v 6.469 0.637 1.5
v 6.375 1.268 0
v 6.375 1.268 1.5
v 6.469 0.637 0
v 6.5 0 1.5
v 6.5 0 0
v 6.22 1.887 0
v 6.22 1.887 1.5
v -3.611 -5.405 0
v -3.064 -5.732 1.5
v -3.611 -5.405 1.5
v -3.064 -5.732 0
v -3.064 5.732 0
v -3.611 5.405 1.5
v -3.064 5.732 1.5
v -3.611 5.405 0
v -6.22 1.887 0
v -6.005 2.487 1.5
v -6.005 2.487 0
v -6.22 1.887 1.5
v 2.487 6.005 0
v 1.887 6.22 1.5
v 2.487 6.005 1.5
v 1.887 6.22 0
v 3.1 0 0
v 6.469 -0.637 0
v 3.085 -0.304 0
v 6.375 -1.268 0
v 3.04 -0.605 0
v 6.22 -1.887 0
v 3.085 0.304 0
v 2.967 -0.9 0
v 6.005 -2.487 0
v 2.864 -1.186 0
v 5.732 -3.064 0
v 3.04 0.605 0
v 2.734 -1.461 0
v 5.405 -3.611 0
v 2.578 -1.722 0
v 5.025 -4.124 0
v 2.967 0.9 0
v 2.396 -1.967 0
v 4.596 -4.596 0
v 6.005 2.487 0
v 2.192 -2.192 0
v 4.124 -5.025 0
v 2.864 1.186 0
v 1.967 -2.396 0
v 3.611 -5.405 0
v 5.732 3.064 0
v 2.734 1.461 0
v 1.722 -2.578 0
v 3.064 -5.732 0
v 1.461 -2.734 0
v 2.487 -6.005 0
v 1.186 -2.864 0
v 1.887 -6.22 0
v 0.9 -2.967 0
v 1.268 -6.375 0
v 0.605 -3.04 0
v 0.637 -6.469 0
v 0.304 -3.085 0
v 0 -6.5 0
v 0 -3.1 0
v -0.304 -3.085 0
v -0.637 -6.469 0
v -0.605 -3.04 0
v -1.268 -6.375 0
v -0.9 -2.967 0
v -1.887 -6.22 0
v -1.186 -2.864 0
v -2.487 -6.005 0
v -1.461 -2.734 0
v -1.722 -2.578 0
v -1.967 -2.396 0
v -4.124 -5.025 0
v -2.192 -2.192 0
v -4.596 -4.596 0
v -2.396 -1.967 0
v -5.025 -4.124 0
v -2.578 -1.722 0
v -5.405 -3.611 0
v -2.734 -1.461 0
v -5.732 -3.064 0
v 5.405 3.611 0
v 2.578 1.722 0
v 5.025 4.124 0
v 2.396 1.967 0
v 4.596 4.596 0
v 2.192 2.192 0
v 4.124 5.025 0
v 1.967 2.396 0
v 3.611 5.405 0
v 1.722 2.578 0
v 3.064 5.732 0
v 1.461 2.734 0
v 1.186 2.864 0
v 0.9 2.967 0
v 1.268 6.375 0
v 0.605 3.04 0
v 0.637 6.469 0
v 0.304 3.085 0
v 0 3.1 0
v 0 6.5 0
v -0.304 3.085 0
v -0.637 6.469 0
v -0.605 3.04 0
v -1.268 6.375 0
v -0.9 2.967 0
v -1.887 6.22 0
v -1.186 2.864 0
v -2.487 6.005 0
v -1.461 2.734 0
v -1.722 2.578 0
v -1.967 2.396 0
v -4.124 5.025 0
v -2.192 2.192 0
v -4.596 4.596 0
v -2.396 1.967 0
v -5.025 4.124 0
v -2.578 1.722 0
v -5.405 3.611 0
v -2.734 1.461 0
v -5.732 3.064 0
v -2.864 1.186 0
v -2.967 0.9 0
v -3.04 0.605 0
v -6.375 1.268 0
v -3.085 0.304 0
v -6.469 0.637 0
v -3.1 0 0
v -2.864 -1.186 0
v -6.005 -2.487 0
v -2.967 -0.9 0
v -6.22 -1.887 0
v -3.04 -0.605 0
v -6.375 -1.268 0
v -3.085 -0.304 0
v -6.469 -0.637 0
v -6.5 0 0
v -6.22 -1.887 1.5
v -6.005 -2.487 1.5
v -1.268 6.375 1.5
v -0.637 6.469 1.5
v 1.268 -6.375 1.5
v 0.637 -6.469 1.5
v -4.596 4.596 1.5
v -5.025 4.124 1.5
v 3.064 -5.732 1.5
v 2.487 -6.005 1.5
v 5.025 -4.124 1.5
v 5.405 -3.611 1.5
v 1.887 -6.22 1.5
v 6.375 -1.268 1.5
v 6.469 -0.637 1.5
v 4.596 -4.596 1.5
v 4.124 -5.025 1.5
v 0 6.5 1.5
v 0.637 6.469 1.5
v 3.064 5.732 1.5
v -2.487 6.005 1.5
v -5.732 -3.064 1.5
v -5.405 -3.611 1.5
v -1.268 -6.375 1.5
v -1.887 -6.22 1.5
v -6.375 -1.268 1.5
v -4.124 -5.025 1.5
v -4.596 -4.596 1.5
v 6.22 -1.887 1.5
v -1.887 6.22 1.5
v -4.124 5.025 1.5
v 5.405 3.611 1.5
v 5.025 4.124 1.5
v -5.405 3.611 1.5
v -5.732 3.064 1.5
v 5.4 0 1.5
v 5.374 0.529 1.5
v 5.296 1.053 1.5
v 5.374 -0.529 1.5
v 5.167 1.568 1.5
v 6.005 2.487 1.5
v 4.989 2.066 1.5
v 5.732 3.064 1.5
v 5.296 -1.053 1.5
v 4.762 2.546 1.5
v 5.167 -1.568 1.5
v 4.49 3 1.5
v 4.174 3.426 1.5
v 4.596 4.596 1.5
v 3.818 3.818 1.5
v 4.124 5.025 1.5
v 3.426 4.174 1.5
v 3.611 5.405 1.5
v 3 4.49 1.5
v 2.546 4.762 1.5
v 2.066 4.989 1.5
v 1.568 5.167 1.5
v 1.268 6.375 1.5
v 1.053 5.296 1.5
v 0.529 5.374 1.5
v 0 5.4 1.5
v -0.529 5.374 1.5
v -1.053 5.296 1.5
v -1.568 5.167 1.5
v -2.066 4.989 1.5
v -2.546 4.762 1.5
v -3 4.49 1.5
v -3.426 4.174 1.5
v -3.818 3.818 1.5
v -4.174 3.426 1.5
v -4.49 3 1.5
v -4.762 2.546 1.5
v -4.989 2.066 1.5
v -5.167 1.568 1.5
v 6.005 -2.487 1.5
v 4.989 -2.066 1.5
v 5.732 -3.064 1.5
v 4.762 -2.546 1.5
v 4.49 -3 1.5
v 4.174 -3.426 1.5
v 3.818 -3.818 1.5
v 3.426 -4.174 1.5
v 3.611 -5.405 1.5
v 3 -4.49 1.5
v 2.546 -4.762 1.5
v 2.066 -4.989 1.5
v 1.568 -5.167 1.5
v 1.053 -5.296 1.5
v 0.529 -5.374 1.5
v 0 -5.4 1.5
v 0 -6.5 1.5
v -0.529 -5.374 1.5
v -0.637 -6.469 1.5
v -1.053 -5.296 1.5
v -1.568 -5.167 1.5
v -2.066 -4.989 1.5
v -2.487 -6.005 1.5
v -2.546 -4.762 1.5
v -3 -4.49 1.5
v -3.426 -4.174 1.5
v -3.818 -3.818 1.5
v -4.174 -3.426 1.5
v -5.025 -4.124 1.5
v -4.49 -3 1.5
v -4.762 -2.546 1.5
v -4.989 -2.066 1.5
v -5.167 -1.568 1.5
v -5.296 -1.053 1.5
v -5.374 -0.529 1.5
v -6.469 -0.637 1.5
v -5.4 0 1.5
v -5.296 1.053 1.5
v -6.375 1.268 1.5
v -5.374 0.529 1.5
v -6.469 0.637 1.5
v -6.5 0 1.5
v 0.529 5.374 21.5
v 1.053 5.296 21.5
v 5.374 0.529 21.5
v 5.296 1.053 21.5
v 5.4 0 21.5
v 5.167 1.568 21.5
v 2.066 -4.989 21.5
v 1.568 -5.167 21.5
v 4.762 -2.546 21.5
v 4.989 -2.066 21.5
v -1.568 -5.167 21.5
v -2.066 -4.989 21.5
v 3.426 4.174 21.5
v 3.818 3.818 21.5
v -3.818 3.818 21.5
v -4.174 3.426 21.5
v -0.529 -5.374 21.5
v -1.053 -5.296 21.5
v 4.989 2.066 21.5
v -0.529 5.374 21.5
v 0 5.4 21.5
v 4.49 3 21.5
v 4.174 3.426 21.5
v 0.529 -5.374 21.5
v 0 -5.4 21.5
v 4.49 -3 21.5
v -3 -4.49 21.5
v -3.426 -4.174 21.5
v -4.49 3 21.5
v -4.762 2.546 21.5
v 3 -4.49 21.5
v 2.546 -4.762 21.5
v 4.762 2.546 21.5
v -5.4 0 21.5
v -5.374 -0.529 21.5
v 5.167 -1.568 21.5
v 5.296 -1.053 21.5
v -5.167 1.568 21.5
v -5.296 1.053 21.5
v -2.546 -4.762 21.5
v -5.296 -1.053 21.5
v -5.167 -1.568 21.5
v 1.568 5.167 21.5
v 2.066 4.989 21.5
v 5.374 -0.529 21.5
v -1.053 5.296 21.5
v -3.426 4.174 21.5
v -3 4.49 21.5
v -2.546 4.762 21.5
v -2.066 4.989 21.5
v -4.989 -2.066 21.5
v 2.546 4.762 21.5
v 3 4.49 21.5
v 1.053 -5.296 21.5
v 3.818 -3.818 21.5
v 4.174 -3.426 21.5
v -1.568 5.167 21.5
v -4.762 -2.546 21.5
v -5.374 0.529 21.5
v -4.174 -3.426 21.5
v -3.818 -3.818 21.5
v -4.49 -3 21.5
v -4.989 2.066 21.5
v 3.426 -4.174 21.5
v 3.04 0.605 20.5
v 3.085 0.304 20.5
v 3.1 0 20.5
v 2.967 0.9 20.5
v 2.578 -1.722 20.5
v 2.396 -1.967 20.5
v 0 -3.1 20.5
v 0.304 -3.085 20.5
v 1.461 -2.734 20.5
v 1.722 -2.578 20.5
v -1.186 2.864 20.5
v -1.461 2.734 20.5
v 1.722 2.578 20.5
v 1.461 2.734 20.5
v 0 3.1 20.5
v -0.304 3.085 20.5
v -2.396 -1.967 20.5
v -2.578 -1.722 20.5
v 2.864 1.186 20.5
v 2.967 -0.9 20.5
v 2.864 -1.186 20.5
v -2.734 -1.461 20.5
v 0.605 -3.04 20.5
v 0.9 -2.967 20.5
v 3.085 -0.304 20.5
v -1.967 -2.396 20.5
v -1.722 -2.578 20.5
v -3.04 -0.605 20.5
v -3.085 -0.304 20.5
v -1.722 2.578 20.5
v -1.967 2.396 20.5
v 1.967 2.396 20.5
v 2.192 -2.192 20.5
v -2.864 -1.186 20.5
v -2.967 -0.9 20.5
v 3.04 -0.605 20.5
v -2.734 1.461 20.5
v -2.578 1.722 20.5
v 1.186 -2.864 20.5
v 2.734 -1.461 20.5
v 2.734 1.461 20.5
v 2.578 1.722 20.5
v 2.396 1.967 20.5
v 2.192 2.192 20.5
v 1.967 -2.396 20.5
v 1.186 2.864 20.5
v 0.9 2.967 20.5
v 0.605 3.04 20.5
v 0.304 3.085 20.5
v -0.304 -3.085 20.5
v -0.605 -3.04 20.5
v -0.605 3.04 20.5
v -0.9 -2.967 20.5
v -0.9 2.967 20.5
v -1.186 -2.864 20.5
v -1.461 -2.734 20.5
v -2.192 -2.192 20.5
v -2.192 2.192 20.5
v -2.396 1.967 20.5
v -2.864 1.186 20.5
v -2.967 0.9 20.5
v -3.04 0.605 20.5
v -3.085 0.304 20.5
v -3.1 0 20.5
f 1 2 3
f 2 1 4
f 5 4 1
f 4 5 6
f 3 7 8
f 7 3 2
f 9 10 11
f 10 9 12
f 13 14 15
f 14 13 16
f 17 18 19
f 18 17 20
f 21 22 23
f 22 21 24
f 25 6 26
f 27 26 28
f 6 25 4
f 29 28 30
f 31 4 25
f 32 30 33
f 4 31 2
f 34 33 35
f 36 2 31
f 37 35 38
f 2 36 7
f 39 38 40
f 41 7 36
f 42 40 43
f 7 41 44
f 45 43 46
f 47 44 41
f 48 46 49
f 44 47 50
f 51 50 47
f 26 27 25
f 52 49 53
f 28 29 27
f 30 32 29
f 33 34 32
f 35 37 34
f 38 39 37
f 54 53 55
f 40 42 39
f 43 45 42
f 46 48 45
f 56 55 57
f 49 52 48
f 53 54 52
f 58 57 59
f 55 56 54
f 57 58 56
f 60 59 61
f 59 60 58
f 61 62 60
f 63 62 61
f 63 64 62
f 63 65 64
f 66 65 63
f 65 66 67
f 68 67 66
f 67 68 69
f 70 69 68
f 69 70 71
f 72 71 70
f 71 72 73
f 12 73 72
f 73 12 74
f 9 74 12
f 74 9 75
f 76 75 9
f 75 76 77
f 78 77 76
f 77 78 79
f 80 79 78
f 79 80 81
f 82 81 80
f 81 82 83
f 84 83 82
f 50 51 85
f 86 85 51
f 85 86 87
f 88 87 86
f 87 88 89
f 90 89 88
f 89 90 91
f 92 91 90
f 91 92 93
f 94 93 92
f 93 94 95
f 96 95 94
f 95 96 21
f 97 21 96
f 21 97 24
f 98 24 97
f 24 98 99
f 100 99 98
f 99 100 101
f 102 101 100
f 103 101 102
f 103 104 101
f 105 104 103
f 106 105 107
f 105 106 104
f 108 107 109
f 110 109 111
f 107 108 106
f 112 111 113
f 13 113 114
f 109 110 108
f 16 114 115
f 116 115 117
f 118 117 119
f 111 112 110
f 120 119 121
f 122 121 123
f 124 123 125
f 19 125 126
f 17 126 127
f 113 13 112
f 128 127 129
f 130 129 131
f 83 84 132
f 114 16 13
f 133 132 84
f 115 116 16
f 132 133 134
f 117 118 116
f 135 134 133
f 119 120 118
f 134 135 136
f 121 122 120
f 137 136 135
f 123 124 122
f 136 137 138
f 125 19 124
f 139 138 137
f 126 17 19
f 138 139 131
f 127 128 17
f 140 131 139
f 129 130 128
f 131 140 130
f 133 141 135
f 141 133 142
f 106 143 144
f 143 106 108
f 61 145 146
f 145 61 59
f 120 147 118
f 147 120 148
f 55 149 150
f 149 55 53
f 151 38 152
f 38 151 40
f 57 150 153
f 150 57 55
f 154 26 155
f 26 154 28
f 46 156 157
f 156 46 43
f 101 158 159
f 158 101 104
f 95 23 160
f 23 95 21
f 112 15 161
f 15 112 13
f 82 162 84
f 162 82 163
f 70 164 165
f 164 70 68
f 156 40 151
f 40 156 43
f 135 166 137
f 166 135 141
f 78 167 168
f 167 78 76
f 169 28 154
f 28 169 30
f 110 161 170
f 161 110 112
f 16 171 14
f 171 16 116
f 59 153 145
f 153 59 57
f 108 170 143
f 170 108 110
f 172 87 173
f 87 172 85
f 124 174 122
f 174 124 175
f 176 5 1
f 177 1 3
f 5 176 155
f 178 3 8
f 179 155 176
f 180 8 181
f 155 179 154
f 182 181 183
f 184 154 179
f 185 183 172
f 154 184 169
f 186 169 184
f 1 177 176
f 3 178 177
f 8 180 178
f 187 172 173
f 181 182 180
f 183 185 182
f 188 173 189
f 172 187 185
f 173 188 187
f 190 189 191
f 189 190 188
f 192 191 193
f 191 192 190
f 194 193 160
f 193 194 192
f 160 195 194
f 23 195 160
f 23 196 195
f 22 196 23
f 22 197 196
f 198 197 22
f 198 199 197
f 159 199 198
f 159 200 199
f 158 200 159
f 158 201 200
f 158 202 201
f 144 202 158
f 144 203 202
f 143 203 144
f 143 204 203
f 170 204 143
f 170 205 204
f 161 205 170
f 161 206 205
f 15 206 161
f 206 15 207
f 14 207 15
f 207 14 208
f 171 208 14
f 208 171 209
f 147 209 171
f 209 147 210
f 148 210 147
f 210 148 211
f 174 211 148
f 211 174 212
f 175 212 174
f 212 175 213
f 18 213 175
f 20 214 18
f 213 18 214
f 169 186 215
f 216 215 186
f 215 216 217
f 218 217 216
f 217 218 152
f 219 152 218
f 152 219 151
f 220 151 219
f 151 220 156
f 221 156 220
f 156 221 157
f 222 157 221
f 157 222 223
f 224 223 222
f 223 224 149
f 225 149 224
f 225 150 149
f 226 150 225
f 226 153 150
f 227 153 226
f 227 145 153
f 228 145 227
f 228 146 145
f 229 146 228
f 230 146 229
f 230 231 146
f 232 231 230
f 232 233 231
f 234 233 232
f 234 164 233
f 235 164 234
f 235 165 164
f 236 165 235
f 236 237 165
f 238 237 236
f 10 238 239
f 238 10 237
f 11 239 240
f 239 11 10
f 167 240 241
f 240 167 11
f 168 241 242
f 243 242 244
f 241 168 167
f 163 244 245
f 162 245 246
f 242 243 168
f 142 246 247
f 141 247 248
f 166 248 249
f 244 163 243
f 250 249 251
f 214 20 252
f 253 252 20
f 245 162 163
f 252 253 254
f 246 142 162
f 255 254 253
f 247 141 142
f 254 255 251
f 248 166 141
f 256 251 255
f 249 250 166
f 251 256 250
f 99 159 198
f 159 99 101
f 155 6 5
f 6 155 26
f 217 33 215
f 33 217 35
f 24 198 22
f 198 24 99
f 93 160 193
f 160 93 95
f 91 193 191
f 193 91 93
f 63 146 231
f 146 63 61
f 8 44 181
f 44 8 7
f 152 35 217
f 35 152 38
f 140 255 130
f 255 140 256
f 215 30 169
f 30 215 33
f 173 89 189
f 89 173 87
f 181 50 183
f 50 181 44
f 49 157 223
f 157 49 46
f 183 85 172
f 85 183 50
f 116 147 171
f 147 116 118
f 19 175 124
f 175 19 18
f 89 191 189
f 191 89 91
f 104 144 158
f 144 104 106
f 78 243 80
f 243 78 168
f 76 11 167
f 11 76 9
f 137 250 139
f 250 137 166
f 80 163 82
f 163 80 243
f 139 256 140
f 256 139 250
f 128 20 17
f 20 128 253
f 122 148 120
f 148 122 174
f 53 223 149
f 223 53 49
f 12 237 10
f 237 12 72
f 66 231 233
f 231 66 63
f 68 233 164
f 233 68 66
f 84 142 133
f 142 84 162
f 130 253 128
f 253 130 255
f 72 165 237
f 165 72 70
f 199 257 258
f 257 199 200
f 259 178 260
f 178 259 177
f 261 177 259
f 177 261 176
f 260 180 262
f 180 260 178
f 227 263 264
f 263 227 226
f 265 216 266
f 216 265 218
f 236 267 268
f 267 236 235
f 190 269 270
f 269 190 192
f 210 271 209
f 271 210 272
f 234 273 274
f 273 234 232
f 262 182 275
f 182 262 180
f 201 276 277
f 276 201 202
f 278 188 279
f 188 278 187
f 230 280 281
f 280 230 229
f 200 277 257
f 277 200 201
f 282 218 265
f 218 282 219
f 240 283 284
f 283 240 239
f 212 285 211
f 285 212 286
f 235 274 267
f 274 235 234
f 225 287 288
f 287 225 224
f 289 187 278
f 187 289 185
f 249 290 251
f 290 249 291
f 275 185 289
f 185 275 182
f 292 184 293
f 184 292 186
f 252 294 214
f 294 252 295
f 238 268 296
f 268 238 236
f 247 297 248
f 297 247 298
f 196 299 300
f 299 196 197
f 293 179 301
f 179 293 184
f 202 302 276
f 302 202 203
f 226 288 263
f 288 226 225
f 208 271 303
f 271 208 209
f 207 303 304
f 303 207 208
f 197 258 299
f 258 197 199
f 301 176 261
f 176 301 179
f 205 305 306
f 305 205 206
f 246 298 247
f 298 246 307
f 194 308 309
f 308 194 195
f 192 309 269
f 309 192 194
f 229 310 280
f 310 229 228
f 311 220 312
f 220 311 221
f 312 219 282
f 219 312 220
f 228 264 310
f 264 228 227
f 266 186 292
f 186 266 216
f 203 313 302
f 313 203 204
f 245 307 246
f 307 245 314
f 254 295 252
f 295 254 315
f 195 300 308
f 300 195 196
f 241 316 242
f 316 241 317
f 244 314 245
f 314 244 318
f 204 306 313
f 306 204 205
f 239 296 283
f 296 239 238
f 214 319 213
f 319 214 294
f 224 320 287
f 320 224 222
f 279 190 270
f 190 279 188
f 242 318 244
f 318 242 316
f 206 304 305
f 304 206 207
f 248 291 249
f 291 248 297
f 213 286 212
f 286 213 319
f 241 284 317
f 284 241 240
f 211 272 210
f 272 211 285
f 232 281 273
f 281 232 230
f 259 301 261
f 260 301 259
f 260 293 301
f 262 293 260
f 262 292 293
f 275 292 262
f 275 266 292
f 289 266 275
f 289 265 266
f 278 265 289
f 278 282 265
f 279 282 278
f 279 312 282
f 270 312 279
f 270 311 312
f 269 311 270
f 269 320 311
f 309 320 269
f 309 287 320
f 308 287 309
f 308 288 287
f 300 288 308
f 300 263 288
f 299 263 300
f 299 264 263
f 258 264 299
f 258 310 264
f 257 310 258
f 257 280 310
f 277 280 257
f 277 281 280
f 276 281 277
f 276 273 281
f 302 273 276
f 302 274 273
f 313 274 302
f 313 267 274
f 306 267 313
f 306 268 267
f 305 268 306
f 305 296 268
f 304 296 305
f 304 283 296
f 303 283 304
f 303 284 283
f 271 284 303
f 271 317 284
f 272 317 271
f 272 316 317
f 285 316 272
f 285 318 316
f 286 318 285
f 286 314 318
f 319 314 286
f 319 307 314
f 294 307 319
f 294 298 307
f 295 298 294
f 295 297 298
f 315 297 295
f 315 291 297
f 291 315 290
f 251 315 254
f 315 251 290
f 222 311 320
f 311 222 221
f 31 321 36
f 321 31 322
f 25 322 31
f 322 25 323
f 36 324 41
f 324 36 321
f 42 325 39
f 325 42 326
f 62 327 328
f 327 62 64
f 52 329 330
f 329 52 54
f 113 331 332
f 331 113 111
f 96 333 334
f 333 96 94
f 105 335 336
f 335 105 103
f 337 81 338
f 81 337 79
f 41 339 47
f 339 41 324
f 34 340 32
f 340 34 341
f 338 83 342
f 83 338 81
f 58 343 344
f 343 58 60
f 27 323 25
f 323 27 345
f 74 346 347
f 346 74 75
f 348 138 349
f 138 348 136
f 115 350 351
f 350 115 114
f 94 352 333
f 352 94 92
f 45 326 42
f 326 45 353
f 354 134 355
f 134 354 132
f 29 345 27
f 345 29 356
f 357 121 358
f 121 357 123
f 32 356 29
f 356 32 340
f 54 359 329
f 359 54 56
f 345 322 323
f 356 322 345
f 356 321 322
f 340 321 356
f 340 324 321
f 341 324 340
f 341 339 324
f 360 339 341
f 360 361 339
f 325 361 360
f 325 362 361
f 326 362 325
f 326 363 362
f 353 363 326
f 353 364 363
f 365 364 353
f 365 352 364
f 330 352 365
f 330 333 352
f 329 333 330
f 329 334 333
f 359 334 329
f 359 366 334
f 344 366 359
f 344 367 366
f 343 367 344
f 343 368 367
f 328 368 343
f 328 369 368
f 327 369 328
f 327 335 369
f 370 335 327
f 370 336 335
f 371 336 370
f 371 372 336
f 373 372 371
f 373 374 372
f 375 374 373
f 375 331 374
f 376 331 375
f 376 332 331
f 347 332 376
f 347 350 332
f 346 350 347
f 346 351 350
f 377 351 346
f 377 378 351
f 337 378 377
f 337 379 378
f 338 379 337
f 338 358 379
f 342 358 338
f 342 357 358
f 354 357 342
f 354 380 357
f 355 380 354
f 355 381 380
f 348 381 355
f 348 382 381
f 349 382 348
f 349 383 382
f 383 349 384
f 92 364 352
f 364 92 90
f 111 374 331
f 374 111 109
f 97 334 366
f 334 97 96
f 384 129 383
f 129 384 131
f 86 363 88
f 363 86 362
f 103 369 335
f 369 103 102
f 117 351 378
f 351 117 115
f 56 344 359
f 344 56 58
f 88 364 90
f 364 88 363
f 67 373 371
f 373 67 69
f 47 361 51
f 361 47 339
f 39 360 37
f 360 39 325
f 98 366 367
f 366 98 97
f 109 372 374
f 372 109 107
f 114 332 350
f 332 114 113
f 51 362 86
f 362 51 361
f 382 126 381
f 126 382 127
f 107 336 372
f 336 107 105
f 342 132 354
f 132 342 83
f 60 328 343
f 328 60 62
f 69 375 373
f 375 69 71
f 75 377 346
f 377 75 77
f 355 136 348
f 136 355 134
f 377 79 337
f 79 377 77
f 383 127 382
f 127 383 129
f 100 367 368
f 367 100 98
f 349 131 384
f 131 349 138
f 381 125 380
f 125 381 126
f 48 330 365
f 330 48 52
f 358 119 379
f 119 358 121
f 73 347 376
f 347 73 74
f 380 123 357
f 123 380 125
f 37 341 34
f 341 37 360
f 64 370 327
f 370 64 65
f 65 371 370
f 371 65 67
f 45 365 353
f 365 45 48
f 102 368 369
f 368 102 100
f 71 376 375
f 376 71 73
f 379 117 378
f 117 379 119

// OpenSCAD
// Adapter sleeve: 0.2 mL PCR tube for 1.5 mL tube rack
// Print orientation: collar on bed (z = 0), sleeve body upward

$fn = 64;

// --- Dimensions (mm) ---
collar_d      = 13;    // collar diameter
collar_h      = 1.5;   // collar thickness (z = 0 to 1.5)
sleeve_od     = 10.8;  // sleeve outer diameter
sleeve_top_z  = 21.5;  // top of sleeve body
bore_d        = 6.2;   // through-bore diameter
eps           = 0.5;   // cutter overshoot

total_h = sleeve_top_z - collar_h; // body height (20)

difference() {
    union() {
        // Collar
        cylinder(d = collar_d, h = collar_h);
        // Sleeve body (slightly overlaps collar for a clean union)
        translate([0, 0, collar_h - 0.01])
            cylinder(d = sleeve_od, h = total_h + 0.01);
    }
    // Full-height bore
    translate([0, 0, -eps])
        cylinder(d = bore_d, h = total_h + 2 * eps);
}
